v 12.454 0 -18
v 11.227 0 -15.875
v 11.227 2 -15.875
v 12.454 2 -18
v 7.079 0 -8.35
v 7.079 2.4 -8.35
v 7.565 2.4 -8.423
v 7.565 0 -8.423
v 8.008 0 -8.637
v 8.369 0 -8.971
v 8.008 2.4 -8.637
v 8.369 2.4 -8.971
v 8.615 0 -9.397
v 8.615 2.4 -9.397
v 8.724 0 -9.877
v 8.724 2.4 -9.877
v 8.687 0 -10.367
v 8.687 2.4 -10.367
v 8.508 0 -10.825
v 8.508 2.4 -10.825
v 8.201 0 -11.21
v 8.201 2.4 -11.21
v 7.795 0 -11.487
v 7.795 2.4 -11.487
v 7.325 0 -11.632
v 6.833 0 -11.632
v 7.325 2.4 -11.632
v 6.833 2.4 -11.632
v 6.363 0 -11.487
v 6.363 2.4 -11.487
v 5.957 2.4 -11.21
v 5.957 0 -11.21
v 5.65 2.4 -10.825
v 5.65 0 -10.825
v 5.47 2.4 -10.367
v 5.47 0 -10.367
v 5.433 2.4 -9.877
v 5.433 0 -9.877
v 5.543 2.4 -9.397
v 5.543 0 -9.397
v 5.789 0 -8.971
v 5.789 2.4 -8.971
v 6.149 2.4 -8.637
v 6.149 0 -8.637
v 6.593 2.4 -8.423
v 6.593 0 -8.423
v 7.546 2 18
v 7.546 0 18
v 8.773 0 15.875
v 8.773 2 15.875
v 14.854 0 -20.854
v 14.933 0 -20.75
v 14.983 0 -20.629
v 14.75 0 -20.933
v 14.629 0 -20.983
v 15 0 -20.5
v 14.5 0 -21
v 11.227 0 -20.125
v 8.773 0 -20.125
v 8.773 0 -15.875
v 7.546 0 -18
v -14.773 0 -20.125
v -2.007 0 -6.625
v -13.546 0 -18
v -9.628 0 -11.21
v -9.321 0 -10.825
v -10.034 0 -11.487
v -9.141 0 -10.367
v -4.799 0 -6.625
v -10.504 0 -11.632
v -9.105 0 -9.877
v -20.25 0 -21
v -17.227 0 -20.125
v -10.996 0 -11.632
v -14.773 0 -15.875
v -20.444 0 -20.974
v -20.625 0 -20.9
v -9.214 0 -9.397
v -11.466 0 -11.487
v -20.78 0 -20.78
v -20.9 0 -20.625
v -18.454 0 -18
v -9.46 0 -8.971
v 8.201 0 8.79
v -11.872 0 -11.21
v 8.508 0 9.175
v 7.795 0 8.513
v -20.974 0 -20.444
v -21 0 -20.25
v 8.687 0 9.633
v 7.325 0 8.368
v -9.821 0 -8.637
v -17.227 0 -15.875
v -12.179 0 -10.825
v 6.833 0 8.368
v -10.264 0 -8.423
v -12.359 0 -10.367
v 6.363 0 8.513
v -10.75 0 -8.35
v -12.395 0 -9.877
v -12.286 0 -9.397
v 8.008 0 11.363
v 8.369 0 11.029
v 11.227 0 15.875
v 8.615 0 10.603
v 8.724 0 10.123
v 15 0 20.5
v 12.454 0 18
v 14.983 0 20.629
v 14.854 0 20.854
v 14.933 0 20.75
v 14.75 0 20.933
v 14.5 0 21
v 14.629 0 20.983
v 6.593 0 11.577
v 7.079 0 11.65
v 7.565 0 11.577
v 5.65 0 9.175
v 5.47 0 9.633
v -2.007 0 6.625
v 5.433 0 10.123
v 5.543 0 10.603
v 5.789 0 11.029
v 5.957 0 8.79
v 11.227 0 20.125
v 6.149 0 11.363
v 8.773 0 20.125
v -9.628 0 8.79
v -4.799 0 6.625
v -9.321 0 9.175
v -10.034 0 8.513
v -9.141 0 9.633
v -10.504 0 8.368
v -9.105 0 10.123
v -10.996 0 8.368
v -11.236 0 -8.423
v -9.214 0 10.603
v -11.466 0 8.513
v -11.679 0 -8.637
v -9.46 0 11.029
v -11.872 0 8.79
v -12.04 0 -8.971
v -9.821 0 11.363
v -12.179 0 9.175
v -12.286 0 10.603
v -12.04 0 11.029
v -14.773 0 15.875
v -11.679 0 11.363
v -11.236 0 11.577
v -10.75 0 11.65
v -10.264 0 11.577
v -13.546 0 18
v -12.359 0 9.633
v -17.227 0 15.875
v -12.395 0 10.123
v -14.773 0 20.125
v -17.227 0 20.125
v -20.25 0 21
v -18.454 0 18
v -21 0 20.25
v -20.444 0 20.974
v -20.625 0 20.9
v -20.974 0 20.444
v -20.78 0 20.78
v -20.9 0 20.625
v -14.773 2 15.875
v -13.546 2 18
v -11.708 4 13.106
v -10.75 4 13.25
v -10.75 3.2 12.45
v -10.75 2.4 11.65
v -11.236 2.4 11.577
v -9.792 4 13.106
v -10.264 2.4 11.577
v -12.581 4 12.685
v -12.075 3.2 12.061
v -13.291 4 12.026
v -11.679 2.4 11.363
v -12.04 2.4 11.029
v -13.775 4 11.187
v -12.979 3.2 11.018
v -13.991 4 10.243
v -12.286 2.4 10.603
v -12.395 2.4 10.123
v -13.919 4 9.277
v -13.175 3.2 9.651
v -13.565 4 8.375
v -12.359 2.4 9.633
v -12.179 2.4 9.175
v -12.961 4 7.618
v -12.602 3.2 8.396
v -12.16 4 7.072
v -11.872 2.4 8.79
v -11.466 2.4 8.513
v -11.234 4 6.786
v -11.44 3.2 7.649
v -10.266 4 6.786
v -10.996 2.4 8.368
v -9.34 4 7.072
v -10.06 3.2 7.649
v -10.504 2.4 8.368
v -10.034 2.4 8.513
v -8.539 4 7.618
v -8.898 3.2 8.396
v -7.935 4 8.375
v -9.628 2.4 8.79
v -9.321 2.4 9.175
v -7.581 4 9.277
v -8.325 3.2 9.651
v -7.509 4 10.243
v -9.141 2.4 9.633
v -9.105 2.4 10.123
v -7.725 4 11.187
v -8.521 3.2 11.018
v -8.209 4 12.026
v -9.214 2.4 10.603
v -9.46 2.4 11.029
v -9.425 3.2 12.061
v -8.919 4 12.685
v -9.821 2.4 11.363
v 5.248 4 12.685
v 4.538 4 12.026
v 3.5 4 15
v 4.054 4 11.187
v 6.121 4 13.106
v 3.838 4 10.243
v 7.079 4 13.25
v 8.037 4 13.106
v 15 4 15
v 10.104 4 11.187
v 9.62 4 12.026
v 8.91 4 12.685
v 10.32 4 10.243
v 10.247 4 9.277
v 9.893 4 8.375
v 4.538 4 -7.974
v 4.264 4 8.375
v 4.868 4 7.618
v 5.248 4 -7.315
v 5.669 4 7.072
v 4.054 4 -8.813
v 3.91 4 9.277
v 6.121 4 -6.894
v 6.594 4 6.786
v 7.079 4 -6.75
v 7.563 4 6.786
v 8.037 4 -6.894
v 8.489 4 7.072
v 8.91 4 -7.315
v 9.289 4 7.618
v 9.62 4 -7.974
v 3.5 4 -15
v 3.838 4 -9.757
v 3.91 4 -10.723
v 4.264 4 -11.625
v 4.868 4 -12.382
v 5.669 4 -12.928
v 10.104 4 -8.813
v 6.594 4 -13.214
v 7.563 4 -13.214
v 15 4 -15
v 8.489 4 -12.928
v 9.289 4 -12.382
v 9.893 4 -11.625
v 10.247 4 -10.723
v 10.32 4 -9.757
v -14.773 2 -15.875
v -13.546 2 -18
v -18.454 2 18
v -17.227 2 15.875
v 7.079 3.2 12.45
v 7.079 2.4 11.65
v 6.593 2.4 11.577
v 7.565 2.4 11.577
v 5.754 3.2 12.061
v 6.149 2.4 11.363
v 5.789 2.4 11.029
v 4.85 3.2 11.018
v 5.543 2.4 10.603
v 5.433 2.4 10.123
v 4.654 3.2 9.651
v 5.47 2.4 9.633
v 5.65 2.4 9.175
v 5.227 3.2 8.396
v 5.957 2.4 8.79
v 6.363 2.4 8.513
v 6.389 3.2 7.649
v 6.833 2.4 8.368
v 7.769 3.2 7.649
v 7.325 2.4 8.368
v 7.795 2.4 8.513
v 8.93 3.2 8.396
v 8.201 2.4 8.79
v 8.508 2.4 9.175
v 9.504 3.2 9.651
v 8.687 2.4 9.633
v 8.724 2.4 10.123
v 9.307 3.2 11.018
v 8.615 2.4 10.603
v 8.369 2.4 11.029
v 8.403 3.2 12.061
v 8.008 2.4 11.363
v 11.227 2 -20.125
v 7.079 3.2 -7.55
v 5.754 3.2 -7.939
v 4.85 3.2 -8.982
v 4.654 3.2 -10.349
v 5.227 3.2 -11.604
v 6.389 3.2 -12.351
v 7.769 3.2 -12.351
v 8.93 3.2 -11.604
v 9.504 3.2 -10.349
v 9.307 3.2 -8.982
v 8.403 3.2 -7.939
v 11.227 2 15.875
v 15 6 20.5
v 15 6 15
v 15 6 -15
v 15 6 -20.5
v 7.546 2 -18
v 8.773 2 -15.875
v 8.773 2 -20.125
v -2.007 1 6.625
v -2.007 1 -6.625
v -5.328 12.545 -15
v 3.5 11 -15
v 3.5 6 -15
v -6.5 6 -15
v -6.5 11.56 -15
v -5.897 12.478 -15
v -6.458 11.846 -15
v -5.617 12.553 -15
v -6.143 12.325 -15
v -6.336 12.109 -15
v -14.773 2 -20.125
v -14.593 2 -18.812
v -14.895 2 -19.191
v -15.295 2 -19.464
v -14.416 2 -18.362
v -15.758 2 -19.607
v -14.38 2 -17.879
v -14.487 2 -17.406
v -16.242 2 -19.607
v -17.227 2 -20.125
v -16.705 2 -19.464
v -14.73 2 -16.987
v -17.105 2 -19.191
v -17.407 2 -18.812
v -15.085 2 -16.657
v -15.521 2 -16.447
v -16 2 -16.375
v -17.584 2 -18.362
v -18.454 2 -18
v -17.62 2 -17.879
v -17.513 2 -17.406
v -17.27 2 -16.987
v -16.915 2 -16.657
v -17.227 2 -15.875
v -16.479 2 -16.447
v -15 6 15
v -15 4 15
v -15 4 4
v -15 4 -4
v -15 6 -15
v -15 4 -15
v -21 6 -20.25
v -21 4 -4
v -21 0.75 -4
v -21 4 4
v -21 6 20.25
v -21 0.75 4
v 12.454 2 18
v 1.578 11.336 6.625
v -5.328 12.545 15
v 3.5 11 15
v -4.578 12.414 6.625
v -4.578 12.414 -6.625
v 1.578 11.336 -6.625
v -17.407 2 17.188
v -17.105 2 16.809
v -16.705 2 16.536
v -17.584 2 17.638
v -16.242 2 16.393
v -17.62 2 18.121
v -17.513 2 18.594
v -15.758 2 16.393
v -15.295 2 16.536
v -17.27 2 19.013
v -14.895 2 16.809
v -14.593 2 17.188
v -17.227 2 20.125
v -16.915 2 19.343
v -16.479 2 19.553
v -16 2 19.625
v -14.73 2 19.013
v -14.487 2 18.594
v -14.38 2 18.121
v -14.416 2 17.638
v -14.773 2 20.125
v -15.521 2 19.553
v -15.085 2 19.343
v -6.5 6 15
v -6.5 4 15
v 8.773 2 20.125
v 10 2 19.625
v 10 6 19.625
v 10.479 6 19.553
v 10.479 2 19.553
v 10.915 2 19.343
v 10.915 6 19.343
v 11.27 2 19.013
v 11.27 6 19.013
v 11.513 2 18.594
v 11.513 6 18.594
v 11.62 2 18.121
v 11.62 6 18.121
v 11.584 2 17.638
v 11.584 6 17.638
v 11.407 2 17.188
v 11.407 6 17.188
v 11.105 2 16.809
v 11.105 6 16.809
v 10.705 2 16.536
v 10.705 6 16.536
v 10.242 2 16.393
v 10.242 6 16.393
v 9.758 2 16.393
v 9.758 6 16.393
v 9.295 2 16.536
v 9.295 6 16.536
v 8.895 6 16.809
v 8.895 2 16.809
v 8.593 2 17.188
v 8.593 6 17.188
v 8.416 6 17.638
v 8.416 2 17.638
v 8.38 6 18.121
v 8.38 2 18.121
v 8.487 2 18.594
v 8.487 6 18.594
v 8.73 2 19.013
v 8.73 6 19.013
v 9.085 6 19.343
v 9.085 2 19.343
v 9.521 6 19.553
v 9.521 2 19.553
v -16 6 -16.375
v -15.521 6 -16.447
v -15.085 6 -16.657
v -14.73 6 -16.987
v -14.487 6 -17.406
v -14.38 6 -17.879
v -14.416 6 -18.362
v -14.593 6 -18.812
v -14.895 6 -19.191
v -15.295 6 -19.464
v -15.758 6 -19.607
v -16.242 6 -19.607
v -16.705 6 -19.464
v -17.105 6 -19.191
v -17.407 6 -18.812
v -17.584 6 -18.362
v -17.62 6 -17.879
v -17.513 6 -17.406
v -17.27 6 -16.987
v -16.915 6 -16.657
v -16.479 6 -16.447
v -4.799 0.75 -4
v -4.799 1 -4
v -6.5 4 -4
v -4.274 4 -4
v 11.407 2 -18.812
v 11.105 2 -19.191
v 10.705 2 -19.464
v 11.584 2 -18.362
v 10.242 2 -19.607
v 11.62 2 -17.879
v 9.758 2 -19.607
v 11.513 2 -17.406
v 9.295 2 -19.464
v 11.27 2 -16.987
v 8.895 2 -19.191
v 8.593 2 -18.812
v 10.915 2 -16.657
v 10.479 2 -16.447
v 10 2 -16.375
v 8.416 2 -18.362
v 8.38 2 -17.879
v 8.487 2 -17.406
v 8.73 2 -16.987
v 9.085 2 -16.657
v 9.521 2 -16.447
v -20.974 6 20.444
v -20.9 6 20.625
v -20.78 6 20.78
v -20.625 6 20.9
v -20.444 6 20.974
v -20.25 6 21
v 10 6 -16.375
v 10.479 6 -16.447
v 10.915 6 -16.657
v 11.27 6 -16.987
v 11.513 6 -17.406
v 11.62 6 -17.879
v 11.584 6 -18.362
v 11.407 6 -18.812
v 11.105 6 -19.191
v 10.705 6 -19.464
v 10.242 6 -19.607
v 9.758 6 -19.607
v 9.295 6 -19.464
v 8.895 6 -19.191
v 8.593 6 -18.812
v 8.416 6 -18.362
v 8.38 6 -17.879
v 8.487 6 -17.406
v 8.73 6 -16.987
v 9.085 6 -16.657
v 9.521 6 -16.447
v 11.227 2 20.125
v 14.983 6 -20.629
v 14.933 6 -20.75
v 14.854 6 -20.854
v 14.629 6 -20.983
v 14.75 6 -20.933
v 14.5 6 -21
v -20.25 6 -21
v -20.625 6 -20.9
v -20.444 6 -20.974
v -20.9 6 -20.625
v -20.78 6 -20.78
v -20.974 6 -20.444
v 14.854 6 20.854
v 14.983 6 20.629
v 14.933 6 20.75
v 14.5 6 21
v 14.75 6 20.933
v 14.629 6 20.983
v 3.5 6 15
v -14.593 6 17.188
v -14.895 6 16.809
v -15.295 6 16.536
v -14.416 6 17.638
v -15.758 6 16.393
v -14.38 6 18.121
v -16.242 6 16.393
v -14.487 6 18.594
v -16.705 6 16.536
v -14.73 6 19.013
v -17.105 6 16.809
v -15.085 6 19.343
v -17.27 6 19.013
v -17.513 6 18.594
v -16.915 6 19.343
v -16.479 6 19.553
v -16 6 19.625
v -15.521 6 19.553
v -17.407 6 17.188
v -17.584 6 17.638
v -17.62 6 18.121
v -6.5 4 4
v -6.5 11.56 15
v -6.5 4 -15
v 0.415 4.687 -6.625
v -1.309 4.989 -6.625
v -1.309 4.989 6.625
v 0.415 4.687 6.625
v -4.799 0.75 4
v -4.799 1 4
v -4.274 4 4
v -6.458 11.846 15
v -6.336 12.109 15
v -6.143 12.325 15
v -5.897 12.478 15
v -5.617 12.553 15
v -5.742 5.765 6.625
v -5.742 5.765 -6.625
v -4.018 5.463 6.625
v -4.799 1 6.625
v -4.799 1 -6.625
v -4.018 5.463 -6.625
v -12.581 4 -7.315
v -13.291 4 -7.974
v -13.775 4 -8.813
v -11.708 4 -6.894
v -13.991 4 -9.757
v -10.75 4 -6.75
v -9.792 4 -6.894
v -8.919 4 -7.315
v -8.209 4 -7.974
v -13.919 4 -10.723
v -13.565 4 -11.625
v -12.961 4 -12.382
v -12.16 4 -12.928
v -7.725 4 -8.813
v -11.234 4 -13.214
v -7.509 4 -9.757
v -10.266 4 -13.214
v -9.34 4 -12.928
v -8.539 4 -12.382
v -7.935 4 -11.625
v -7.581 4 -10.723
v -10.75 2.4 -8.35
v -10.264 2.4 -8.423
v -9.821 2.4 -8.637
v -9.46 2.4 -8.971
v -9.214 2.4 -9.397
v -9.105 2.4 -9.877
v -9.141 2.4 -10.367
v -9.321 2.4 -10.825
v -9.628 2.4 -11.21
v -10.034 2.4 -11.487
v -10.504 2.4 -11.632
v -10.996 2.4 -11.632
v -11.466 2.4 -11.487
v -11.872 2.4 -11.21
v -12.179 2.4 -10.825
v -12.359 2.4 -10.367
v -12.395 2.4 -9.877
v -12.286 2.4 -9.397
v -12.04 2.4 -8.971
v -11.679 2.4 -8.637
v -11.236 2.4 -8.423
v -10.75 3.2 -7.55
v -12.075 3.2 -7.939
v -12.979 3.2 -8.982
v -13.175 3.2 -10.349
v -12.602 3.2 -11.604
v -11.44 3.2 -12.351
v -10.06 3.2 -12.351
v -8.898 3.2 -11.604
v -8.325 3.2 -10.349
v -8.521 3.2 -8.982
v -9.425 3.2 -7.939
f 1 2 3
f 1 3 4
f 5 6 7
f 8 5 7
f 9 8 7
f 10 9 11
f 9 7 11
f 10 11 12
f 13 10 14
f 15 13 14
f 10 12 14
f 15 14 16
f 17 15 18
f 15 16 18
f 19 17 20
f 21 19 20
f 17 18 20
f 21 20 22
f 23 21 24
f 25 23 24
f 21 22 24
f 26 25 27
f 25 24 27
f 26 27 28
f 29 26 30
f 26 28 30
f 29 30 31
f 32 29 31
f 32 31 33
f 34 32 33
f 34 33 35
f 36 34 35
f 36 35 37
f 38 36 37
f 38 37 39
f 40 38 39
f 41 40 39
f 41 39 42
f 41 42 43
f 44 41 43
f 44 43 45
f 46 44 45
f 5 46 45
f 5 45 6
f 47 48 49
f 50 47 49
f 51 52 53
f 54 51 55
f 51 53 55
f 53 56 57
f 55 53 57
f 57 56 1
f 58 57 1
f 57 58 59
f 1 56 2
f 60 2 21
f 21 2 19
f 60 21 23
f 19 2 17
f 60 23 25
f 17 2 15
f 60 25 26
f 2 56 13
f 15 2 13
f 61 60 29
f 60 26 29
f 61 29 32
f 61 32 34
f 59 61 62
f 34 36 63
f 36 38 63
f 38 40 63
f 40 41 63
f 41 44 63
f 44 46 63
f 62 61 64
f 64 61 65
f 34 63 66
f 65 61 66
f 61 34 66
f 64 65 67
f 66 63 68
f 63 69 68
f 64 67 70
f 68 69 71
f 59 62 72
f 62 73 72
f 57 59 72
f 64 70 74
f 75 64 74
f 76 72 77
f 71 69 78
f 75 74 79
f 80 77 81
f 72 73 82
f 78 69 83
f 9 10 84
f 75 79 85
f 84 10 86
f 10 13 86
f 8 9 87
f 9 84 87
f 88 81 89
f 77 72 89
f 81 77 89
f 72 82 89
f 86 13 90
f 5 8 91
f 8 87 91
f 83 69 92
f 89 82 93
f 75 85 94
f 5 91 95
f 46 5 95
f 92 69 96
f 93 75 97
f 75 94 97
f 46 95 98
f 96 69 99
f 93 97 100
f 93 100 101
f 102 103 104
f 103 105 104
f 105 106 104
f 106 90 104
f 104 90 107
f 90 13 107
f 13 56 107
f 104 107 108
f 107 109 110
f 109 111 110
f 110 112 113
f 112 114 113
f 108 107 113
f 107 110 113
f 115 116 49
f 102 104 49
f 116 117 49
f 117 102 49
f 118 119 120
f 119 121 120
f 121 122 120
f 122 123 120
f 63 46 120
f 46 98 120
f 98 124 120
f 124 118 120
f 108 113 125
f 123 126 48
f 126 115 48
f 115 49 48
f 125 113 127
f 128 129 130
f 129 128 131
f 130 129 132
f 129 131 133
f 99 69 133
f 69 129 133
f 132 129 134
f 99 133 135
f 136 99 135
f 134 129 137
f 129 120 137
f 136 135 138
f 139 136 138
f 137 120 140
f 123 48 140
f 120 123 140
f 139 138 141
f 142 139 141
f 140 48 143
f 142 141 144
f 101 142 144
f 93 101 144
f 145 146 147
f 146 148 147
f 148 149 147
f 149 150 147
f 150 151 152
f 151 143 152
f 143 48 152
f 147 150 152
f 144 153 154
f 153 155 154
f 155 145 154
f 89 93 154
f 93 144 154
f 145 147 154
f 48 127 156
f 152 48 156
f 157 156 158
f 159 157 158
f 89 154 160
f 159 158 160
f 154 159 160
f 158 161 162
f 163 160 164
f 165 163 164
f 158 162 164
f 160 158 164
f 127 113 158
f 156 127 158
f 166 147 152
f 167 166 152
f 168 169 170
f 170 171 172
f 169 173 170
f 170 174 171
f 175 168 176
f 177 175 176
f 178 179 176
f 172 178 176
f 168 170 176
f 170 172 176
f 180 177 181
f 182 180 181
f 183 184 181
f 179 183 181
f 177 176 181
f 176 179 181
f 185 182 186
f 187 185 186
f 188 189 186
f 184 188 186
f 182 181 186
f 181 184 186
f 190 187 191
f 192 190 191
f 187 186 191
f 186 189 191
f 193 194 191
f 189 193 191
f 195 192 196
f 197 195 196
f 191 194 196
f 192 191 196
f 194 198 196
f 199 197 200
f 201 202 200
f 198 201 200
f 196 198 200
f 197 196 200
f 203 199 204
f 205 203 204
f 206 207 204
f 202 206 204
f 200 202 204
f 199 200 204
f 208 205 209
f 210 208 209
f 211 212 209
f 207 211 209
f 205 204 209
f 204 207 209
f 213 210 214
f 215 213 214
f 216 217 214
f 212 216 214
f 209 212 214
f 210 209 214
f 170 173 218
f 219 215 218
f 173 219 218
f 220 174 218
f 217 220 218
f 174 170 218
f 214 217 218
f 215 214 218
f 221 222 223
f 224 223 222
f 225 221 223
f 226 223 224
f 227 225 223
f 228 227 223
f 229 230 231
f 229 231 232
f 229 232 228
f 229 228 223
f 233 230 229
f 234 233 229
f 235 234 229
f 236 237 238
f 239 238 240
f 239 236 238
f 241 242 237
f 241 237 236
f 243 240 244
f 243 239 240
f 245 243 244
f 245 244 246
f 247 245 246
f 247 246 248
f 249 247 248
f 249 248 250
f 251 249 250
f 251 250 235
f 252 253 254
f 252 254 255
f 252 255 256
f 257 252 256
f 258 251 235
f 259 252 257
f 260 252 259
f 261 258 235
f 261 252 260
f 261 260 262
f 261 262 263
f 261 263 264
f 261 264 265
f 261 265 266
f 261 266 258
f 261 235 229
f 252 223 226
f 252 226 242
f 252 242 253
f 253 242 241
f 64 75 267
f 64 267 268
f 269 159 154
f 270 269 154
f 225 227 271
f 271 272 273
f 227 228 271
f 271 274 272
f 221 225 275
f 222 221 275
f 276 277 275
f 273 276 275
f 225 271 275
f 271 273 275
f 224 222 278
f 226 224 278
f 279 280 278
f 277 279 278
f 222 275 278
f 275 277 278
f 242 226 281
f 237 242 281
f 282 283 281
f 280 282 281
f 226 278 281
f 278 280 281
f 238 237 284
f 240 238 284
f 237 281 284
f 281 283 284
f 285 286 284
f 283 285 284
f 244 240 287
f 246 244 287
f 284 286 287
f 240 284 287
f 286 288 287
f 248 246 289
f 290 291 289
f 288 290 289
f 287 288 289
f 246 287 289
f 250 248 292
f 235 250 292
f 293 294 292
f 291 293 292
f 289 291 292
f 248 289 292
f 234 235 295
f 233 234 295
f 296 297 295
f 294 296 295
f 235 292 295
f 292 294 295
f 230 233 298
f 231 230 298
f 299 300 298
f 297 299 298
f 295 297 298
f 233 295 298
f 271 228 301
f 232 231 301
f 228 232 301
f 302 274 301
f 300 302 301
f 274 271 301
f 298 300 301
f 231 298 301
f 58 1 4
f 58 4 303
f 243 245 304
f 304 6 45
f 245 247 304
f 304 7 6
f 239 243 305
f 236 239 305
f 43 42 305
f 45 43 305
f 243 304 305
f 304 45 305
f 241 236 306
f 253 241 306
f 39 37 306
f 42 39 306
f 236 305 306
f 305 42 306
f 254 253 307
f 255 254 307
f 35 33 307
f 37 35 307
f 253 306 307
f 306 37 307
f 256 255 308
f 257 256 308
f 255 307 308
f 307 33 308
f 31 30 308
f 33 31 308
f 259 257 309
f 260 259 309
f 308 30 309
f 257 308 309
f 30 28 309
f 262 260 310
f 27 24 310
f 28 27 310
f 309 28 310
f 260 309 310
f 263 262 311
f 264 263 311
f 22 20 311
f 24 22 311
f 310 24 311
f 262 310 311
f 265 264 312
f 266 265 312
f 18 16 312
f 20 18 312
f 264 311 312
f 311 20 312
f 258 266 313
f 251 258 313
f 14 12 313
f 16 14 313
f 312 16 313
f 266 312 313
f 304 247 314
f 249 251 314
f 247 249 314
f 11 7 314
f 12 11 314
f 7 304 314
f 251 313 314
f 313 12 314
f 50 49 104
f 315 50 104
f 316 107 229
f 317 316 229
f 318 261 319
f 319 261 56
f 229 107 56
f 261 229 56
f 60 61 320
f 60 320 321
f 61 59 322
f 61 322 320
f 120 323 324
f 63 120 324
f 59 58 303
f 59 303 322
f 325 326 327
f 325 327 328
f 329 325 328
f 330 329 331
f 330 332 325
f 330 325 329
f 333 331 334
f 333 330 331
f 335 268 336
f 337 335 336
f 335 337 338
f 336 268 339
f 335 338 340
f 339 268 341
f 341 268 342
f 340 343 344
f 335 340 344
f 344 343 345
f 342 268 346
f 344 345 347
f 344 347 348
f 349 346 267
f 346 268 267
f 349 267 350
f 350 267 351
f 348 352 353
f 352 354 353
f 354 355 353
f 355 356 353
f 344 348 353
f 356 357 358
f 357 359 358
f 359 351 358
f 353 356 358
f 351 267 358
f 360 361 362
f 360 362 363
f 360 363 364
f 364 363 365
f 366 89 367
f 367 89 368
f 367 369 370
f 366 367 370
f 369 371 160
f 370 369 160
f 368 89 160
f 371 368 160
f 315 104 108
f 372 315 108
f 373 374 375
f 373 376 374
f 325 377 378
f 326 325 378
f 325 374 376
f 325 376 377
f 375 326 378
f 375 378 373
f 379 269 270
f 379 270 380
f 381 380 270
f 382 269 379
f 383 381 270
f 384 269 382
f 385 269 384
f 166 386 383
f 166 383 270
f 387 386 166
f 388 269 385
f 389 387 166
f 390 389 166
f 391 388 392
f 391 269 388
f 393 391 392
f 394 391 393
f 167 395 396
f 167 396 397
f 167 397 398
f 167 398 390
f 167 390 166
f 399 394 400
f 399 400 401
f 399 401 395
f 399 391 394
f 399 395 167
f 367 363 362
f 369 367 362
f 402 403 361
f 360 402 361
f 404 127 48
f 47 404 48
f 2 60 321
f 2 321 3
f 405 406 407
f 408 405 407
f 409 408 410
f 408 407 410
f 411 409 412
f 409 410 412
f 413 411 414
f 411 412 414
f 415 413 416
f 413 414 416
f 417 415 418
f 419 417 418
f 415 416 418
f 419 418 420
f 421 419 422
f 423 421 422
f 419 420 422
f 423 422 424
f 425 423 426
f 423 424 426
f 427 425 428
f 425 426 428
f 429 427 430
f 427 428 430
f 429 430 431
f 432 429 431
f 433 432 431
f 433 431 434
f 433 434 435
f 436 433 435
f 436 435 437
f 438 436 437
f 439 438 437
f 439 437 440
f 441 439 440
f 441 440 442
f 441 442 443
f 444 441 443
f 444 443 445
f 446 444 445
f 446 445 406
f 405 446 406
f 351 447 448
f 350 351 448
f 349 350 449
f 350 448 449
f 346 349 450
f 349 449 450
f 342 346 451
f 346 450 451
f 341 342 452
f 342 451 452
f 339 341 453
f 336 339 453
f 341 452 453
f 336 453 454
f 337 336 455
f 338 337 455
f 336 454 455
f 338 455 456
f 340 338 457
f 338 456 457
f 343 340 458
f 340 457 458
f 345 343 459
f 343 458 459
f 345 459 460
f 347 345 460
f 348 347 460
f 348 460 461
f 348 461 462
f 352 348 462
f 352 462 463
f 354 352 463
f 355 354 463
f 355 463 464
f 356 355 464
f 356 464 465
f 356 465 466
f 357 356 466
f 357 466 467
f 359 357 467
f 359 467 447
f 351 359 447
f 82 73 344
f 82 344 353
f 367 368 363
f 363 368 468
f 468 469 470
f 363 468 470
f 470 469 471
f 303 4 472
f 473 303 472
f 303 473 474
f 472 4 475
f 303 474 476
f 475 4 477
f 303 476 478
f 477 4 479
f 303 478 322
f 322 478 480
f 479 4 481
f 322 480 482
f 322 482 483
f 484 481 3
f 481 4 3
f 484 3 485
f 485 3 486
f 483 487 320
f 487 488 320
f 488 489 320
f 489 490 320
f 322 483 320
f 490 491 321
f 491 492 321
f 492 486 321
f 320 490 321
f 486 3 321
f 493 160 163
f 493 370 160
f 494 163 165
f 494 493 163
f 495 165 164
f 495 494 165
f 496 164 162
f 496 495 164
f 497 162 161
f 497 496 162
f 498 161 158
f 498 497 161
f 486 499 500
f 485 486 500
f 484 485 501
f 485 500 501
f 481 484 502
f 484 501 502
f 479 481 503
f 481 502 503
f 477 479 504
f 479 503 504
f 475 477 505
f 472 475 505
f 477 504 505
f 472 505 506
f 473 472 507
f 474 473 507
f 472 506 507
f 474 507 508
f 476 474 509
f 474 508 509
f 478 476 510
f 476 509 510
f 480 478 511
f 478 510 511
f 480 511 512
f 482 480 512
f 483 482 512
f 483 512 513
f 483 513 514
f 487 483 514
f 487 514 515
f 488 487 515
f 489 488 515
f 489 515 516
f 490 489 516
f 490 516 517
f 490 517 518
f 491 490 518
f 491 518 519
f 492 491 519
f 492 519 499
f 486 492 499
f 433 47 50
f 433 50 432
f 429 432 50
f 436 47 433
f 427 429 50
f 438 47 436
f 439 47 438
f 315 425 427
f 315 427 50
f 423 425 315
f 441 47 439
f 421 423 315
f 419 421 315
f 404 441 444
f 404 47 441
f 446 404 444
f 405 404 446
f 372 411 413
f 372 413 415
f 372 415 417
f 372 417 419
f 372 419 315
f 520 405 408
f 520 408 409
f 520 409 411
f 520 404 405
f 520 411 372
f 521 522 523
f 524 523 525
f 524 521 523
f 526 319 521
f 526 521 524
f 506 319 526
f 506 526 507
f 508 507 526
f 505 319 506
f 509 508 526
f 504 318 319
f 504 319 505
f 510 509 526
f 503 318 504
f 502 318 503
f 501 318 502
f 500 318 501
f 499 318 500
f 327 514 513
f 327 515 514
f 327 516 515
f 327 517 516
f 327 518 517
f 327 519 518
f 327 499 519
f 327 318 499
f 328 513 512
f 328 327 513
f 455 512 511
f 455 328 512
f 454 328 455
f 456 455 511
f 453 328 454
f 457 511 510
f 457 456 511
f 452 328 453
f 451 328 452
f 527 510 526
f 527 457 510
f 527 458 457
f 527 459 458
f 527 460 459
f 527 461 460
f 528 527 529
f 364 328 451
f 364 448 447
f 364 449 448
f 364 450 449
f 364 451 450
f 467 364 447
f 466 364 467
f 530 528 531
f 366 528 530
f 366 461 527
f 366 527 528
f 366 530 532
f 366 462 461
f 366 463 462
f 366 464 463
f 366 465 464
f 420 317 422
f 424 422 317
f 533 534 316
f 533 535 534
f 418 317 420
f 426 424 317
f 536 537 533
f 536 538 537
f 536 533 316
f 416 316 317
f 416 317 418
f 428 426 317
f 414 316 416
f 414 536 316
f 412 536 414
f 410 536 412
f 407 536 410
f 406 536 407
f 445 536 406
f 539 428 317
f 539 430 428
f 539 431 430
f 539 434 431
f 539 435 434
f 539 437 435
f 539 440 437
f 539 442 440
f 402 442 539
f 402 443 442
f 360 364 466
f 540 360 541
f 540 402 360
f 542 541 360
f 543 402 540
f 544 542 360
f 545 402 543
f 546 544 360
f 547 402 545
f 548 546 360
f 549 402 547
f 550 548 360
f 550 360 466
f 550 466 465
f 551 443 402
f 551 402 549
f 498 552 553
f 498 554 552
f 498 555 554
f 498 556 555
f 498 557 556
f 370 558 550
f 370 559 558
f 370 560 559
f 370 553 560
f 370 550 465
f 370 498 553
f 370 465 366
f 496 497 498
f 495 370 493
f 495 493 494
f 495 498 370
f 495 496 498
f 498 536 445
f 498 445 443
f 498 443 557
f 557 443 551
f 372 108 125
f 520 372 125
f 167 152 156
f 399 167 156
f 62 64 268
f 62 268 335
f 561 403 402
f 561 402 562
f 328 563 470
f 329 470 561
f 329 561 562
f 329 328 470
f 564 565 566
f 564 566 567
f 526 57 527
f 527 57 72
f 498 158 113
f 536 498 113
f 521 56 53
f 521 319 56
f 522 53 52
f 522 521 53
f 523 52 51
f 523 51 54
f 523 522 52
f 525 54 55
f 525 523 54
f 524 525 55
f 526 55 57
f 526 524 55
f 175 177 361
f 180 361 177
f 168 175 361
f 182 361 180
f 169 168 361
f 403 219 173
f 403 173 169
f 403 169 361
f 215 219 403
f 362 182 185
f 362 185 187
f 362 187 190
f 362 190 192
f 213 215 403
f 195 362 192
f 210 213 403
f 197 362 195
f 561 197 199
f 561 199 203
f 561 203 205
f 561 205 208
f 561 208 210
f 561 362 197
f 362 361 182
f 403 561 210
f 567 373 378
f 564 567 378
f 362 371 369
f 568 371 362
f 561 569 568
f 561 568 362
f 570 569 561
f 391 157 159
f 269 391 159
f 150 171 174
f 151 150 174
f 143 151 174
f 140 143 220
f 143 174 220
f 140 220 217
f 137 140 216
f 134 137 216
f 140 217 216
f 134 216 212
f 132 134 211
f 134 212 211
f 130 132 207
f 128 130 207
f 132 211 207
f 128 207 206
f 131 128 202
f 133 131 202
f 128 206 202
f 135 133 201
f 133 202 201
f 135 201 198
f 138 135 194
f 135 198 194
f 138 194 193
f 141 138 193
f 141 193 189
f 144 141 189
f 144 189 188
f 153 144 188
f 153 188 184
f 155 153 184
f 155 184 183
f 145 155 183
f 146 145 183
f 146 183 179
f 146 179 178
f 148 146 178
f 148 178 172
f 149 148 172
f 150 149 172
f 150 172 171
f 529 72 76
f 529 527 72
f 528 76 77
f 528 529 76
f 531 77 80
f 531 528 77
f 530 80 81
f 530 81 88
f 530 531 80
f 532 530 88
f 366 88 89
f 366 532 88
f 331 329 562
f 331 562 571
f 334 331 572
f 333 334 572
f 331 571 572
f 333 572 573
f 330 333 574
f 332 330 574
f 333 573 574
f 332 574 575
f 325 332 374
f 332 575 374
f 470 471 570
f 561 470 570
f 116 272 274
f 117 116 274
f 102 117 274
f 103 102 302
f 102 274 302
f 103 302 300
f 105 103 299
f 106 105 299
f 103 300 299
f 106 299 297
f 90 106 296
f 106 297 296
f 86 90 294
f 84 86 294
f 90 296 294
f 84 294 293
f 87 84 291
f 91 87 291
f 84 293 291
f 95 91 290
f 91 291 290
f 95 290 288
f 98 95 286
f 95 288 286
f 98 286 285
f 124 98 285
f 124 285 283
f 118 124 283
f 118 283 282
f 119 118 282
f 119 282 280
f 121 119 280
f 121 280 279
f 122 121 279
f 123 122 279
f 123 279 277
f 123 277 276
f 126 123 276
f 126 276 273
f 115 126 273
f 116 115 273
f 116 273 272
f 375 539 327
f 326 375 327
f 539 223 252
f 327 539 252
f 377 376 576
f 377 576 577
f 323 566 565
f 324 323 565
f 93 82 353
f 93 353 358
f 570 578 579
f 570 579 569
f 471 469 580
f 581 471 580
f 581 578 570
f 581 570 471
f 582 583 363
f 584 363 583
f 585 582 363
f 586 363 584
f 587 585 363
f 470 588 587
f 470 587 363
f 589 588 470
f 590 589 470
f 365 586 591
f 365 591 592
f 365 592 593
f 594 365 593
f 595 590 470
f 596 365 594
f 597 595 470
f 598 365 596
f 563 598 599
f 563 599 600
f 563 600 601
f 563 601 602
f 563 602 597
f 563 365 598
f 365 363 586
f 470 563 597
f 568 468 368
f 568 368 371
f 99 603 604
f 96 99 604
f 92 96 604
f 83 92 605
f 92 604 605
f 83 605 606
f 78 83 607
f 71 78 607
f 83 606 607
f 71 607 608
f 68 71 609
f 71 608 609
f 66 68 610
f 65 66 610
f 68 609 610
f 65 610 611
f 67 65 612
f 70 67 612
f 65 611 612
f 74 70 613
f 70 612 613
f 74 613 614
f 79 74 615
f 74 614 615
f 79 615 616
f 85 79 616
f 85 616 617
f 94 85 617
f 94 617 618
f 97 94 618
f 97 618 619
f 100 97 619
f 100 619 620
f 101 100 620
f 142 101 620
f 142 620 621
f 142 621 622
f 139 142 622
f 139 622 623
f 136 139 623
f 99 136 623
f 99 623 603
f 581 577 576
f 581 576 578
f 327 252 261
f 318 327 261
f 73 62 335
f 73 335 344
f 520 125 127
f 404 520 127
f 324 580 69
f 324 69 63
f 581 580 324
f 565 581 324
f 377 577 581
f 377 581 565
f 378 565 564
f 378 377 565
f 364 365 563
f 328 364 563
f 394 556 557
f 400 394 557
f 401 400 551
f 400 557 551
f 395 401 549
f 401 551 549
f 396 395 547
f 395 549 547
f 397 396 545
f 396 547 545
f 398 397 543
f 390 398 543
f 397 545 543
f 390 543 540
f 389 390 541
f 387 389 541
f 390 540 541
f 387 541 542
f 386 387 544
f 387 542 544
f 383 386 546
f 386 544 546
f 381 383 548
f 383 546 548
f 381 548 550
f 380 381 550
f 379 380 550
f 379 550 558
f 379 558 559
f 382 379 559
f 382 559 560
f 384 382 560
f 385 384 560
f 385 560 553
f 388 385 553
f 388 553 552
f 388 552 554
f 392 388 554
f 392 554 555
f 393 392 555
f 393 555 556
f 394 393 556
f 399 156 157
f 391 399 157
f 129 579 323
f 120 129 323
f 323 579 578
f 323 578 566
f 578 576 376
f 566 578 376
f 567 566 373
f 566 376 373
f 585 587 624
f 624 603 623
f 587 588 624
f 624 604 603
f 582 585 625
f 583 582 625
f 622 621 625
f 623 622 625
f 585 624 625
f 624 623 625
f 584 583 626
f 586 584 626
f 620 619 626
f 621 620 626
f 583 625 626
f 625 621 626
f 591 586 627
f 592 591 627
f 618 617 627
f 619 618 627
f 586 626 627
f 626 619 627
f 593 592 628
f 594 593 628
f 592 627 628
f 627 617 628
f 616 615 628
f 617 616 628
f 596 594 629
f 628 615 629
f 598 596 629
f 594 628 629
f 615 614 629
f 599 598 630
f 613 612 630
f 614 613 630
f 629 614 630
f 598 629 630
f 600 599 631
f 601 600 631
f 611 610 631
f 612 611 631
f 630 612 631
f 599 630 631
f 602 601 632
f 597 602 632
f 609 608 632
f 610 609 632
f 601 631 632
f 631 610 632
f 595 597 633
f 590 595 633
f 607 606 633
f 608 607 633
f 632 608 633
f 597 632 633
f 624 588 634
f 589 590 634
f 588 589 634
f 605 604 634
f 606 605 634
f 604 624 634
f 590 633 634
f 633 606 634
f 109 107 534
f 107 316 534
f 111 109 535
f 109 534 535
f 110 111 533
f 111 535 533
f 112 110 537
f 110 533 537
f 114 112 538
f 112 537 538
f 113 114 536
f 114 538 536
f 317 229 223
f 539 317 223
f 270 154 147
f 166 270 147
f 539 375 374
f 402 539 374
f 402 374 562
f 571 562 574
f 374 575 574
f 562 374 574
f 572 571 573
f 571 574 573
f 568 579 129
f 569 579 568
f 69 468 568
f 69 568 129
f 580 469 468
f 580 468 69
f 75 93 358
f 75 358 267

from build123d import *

# Parameters (mm, degrees)
SKETCH1_W                = 30
SKETCH1_H                = 30
BASE_PLATE_DEPTH         = 1.5
SIDE_WALLS_DEPTH         = 6
SKETCH3_W                = 10
SKETCH3_H                = 30
SWITCH_BLOCK_DEPTH       = 9.5
SKETCH11_W               = 8.5
SKETCH11_H               = 30
SKETCH11_W_2             = 11.5
THICKER_BODY_DEPTH       = 2.5
SWITCH_BLOCK_ANGLE_DEPTH = 30
SKETCH6_W                = 6.25
SKETCH6_H                = 13.25
SWITCH_POCKET_DEPTH      = 6.75
WIRE_CHANNEL_1_REACH     = 33.348
SKETCH7_W                = 2.75
SKETCH7_H                = 13.25
SKETCH19_W               = 2.79179182
SKETCH19_H               = 13.25
SWITCH_REMOVER_DEPTH     = 10
SKETCH4_R                = 1.625
M2_SCREWS_DEPTH          = 6
M2_NUTS_DEPTH            = 2
SKETCH17_R               = 1.65
M3_MOUNTING_SCREWS_DEPTH = 31.960660523
WIRE_CHANNEL_REACH       = 32.267
SKETCH8_W                = 8
SKETCH8_H                = 3.25
FILLET1_R                = 1
FILLET2_R                = 0.5
FILLET3_R                = 0.5
FILLET4_R                = 0.75
FILLET5_R                = 0.75


with BuildPart() as part:
    # Sketch1 → Base Plate (new body)
    with BuildSketch(Plane(origin=(0, 0, 0), x_dir=(1, 0, 0), z_dir=(0, 1, 0))):
        Rectangle(SKETCH1_W, SKETCH1_H)
    extrude(amount=BASE_PLATE_DEPTH)

    # Sketch2 → Side Walls (add)
    with BuildSketch(Plane.XZ):
        Polygon((15, 15), (-15, 15), (-15, -15), (15, -15), (15, -21), (-21, -21), (-21, 21), (15, 21), align=None)
    extrude(amount=-SIDE_WALLS_DEPTH)

    # Sketch3 → Switch Block (add)
    with BuildSketch(Plane(origin=(0, 1.5, 0), x_dir=(1, 0, 0), z_dir=(0, 1, 0))):
        with Locations((-1.5, 0)):
            Rectangle(SKETCH3_W, SKETCH3_H)
    extrude(amount=SWITCH_BLOCK_DEPTH)

    # Sketch11 → Thicker Body (add)
    with BuildSketch(Plane(origin=(0, 1.5, 0), x_dir=(1, 0, 0), z_dir=(0, 1, 0))):
        with Locations((-10.75, 0)):
            Rectangle(SKETCH11_W, SKETCH11_H)
        with Locations((9.25, 0)):
            Rectangle(SKETCH11_W_2, SKETCH11_H)
    extrude(amount=THICKER_BODY_DEPTH)

    # Sketch5 → Switch Block Angle (add)
    with BuildSketch(Plane(origin=(0, 0, -15), x_dir=(-1, 0, 0), z_dir=(0, 0, -1))):
        Polygon((6.5, 11), (6.5, 12.75), (-3.5, 11), align=None)
    extrude(amount=-SWITCH_BLOCK_ANGLE_DEPTH)

    # Sketch6 → Switch Pocket (cut)
    with BuildSketch(Plane(origin=(1.971801092, 11.267434809, 0), x_dir=(0.9850304671557043, -0.17238033175224804, 0), z_dir=(0.17238033175224804, 0.9850304671557043, 0))):
        with Locations((-3.52456214, 0)):
            Rectangle(SKETCH6_W, SKETCH6_H)
    extrude(amount=-SWITCH_POCKET_DEPTH, mode=Mode.SUBTRACT)

    # Wire Channel 1: up to this plane
    wire_channel_1_end = Plane(origin=(0, 1, 0), z_dir=(0, 1, 0))
    # Sketch7 → Wire Channel 1 (cut, up to the surface)
    with BuildSketch(Plane(origin=(0.808233852, 4.618479156, 0), x_dir=(0.9850304671557043, -0.17238033175224815, 0), z_dir=(0.17238033175224815, 0.9850304671557043, 0)), mode=Mode.PRIVATE) as wire_channel_1_sk1:
        with Locations((-3.52456214, 0)):
            Rectangle(SKETCH7_W, SKETCH7_H)
    wire_channel_1_tool1 = split(extrude(wire_channel_1_sk1.sketch, amount=-WIRE_CHANNEL_1_REACH, mode=Mode.PRIVATE), bisect_by=wire_channel_1_end, keep=Keep.BOTH, mode=Mode.PRIVATE)
    add(wire_channel_1_tool1.solids().sort_by_distance((-2.663567, 5.226044, 0))[0], mode=Mode.SUBTRACT)

    # Sketch19 → Switch Remover (cut)
    with BuildSketch(Plane(origin=(0, 1, 0), x_dir=(1, 0, 0), z_dir=(0, 1, 0))):
        with Locations((-3.403125, 0)):
            Rectangle(SKETCH19_W, SKETCH19_H)
    extrude(amount=-SWITCH_REMOVER_DEPTH, mode=Mode.SUBTRACT)

    # Sketch4 → M2 Screws (cut)
    with BuildSketch(Plane(origin=(0, 6, 0), x_dir=(1, 0, 0), z_dir=(0, 1, 0))):
        with Locations(Location((-16, -18, 0), (0, 0, 270))):
            Circle(SKETCH4_R)
        with Locations(Location((10, -18, 0), (0, 0, 270))):
            Circle(SKETCH4_R)
        with Locations(Location((10, 18, 0), (0, 0, 270))):
            Circle(SKETCH4_R)
        with Locations(Location((-16, 18, 0), (0, 0, 270))):
            Circle(SKETCH4_R)
    extrude(amount=-M2_SCREWS_DEPTH, mode=Mode.SUBTRACT)

    # Sketch16 → M2 Nuts (cut)
    with BuildSketch(Plane.XZ):
        Polygon((-14.773130678, 15.875), (-13.546261356, 18), (-14.773130678, 20.125), (-17.226869322, 20.125), (-18.453738644, 18), (-17.226869322, 15.875), align=None)
        Polygon((-17.226869322, -15.875), (-14.773130678, -15.875), (-13.546261356, -18), (-14.773130678, -20.125), (-17.226869322, -20.125), (-18.453738644, -18), align=None)
        Polygon((11.226869322, 15.875), (12.453738644, 18), (11.226869322, 20.125), (8.773130678, 20.125), (7.546261356, 18), (8.773130678, 15.875), align=None)
        Polygon((8.773130678, -15.875), (11.226869322, -15.875), (12.453738644, -18), (11.226869322, -20.125), (8.773130678, -20.125), (7.546261356, -18), align=None)
    extrude(amount=-M2_NUTS_DEPTH, mode=Mode.SUBTRACT)

    # Sketch17 → M3 Mounting Screws (cut, through all)
    with BuildSketch(Plane(origin=(0, 4, 0), x_dir=(1, 0, 0), z_dir=(0, 1, 0))):
        with Locations(Location((7.078853568, 10, 0), (0, 0, 270))):
            Circle(SKETCH17_R)
        with Locations(Location((7.078853568, -10, 0), (0, 0, 270))):
            Circle(SKETCH17_R)
        with Locations(Location((-10.75, -10, 0), (0, 0, 270))):
            Circle(SKETCH17_R)
        with Locations(Location((-10.75, 10, 0), (0, 0, 270))):
            Circle(SKETCH17_R)
    extrude(amount=-M3_MOUNTING_SCREWS_DEPTH, mode=Mode.SUBTRACT)

    # M3 Heads cone 1 section (through the dimple's axis) → M3 Heads (revolve, cut)
    with BuildSketch(Plane(origin=(7.078853568, 4, -10), x_dir=(0, 0, 1), z_dir=(1, 0, 0))):
        Polygon((0, 0), (3.25, 0), (0, 3.25), align=None)
    revolve(axis=Axis((7.078853568, 4, -10), (0, -1, 0)), mode=Mode.SUBTRACT)

    # M3 Heads cone 2 section (through the dimple's axis) → M3 Heads cone 2 (revolve, cut)
    with BuildSketch(Plane(origin=(7.078853568, 4, 10), x_dir=(0, 0, 1), z_dir=(1, 0, 0))):
        Polygon((0, 0), (3.25, 0), (0, 3.25), align=None)
    revolve(axis=Axis((7.078853568, 4, 10), (0, -1, 0)), mode=Mode.SUBTRACT)

    # M3 Heads cone 3 section (through the dimple's axis) → M3 Heads cone 3 (revolve, cut)
    with BuildSketch(Plane(origin=(-10.75, 4, 10), x_dir=(0, 0, 1), z_dir=(1, 0, 0))):
        Polygon((0, 0), (3.25, 0), (0, 3.25), align=None)
    revolve(axis=Axis((-10.75, 4, 10), (0, -1, 0)), mode=Mode.SUBTRACT)

    # M3 Heads cone 4 section (through the dimple's axis) → M3 Heads cone 4 (revolve, cut)
    with BuildSketch(Plane(origin=(-10.75, 4, -10), x_dir=(0, 0, 1), z_dir=(1, 0, 0))):
        Polygon((0, 0), (3.25, 0), (0, 3.25), align=None)
    revolve(axis=Axis((-10.75, 4, -10), (0, -1, 0)), mode=Mode.SUBTRACT)

    # Wire Channel: up to this face of the body (flat: up to its plane)
    wire_channel_end = Plane(part.part.faces().sort_by_distance((-21, 3, 0))[0])
    # Sketch8 → Wire Channel (cut, up to the picked face)
    with BuildSketch(Plane(origin=(-4.017984132, 2.099725317, 0), x_dir=(0, 0, 1), z_dir=(-1, 0, 0)), mode=Mode.PRIVATE) as wire_channel_sk1:
        with Locations((0, 0.275274683)):
            Rectangle(SKETCH8_W, SKETCH8_H)
    wire_channel_tool1 = split(extrude(wire_channel_sk1.sketch, amount=WIRE_CHANNEL_REACH, mode=Mode.PRIVATE), bisect_by=wire_channel_end, keep=Keep.BOTH, mode=Mode.PRIVATE)
    add(wire_channel_tool1.solids().sort_by(Axis((-4.017984, 2.375, 0), (-1, 0, 0)))[0], mode=Mode.SUBTRACT)

    # Fillet1
    fillet1_edges = [part.edges().sort_by_distance(p)[0] for p in [
        (-6.5, 12.75, 0),
    ]]
    fillet(fillet1_edges, radius=FILLET1_R)

    # Fillet2
    fillet2_edges = [part.edges().sort_by_distance(p)[0] for p in [
        (15, 3, 21),
    ]]
    fillet(fillet2_edges, radius=FILLET2_R)

    # Fillet3
    fillet3_edges = [part.edges().sort_by_distance(p)[0] for p in [
        (15, 3, -21),
    ]]
    fillet(fillet3_edges, radius=FILLET3_R)

    # Fillet4
    fillet4_edges = [part.edges().sort_by_distance(p)[0] for p in [
        (-21, 3, -21),
    ]]
    fillet(fillet4_edges, radius=FILLET4_R)

    # Fillet5
    fillet5_edges = [part.edges().sort_by_distance(p)[0] for p in [
        (-21, 3, 21),
    ]]
    fillet(fillet5_edges, radius=FILLET5_R)


solid = part.part
